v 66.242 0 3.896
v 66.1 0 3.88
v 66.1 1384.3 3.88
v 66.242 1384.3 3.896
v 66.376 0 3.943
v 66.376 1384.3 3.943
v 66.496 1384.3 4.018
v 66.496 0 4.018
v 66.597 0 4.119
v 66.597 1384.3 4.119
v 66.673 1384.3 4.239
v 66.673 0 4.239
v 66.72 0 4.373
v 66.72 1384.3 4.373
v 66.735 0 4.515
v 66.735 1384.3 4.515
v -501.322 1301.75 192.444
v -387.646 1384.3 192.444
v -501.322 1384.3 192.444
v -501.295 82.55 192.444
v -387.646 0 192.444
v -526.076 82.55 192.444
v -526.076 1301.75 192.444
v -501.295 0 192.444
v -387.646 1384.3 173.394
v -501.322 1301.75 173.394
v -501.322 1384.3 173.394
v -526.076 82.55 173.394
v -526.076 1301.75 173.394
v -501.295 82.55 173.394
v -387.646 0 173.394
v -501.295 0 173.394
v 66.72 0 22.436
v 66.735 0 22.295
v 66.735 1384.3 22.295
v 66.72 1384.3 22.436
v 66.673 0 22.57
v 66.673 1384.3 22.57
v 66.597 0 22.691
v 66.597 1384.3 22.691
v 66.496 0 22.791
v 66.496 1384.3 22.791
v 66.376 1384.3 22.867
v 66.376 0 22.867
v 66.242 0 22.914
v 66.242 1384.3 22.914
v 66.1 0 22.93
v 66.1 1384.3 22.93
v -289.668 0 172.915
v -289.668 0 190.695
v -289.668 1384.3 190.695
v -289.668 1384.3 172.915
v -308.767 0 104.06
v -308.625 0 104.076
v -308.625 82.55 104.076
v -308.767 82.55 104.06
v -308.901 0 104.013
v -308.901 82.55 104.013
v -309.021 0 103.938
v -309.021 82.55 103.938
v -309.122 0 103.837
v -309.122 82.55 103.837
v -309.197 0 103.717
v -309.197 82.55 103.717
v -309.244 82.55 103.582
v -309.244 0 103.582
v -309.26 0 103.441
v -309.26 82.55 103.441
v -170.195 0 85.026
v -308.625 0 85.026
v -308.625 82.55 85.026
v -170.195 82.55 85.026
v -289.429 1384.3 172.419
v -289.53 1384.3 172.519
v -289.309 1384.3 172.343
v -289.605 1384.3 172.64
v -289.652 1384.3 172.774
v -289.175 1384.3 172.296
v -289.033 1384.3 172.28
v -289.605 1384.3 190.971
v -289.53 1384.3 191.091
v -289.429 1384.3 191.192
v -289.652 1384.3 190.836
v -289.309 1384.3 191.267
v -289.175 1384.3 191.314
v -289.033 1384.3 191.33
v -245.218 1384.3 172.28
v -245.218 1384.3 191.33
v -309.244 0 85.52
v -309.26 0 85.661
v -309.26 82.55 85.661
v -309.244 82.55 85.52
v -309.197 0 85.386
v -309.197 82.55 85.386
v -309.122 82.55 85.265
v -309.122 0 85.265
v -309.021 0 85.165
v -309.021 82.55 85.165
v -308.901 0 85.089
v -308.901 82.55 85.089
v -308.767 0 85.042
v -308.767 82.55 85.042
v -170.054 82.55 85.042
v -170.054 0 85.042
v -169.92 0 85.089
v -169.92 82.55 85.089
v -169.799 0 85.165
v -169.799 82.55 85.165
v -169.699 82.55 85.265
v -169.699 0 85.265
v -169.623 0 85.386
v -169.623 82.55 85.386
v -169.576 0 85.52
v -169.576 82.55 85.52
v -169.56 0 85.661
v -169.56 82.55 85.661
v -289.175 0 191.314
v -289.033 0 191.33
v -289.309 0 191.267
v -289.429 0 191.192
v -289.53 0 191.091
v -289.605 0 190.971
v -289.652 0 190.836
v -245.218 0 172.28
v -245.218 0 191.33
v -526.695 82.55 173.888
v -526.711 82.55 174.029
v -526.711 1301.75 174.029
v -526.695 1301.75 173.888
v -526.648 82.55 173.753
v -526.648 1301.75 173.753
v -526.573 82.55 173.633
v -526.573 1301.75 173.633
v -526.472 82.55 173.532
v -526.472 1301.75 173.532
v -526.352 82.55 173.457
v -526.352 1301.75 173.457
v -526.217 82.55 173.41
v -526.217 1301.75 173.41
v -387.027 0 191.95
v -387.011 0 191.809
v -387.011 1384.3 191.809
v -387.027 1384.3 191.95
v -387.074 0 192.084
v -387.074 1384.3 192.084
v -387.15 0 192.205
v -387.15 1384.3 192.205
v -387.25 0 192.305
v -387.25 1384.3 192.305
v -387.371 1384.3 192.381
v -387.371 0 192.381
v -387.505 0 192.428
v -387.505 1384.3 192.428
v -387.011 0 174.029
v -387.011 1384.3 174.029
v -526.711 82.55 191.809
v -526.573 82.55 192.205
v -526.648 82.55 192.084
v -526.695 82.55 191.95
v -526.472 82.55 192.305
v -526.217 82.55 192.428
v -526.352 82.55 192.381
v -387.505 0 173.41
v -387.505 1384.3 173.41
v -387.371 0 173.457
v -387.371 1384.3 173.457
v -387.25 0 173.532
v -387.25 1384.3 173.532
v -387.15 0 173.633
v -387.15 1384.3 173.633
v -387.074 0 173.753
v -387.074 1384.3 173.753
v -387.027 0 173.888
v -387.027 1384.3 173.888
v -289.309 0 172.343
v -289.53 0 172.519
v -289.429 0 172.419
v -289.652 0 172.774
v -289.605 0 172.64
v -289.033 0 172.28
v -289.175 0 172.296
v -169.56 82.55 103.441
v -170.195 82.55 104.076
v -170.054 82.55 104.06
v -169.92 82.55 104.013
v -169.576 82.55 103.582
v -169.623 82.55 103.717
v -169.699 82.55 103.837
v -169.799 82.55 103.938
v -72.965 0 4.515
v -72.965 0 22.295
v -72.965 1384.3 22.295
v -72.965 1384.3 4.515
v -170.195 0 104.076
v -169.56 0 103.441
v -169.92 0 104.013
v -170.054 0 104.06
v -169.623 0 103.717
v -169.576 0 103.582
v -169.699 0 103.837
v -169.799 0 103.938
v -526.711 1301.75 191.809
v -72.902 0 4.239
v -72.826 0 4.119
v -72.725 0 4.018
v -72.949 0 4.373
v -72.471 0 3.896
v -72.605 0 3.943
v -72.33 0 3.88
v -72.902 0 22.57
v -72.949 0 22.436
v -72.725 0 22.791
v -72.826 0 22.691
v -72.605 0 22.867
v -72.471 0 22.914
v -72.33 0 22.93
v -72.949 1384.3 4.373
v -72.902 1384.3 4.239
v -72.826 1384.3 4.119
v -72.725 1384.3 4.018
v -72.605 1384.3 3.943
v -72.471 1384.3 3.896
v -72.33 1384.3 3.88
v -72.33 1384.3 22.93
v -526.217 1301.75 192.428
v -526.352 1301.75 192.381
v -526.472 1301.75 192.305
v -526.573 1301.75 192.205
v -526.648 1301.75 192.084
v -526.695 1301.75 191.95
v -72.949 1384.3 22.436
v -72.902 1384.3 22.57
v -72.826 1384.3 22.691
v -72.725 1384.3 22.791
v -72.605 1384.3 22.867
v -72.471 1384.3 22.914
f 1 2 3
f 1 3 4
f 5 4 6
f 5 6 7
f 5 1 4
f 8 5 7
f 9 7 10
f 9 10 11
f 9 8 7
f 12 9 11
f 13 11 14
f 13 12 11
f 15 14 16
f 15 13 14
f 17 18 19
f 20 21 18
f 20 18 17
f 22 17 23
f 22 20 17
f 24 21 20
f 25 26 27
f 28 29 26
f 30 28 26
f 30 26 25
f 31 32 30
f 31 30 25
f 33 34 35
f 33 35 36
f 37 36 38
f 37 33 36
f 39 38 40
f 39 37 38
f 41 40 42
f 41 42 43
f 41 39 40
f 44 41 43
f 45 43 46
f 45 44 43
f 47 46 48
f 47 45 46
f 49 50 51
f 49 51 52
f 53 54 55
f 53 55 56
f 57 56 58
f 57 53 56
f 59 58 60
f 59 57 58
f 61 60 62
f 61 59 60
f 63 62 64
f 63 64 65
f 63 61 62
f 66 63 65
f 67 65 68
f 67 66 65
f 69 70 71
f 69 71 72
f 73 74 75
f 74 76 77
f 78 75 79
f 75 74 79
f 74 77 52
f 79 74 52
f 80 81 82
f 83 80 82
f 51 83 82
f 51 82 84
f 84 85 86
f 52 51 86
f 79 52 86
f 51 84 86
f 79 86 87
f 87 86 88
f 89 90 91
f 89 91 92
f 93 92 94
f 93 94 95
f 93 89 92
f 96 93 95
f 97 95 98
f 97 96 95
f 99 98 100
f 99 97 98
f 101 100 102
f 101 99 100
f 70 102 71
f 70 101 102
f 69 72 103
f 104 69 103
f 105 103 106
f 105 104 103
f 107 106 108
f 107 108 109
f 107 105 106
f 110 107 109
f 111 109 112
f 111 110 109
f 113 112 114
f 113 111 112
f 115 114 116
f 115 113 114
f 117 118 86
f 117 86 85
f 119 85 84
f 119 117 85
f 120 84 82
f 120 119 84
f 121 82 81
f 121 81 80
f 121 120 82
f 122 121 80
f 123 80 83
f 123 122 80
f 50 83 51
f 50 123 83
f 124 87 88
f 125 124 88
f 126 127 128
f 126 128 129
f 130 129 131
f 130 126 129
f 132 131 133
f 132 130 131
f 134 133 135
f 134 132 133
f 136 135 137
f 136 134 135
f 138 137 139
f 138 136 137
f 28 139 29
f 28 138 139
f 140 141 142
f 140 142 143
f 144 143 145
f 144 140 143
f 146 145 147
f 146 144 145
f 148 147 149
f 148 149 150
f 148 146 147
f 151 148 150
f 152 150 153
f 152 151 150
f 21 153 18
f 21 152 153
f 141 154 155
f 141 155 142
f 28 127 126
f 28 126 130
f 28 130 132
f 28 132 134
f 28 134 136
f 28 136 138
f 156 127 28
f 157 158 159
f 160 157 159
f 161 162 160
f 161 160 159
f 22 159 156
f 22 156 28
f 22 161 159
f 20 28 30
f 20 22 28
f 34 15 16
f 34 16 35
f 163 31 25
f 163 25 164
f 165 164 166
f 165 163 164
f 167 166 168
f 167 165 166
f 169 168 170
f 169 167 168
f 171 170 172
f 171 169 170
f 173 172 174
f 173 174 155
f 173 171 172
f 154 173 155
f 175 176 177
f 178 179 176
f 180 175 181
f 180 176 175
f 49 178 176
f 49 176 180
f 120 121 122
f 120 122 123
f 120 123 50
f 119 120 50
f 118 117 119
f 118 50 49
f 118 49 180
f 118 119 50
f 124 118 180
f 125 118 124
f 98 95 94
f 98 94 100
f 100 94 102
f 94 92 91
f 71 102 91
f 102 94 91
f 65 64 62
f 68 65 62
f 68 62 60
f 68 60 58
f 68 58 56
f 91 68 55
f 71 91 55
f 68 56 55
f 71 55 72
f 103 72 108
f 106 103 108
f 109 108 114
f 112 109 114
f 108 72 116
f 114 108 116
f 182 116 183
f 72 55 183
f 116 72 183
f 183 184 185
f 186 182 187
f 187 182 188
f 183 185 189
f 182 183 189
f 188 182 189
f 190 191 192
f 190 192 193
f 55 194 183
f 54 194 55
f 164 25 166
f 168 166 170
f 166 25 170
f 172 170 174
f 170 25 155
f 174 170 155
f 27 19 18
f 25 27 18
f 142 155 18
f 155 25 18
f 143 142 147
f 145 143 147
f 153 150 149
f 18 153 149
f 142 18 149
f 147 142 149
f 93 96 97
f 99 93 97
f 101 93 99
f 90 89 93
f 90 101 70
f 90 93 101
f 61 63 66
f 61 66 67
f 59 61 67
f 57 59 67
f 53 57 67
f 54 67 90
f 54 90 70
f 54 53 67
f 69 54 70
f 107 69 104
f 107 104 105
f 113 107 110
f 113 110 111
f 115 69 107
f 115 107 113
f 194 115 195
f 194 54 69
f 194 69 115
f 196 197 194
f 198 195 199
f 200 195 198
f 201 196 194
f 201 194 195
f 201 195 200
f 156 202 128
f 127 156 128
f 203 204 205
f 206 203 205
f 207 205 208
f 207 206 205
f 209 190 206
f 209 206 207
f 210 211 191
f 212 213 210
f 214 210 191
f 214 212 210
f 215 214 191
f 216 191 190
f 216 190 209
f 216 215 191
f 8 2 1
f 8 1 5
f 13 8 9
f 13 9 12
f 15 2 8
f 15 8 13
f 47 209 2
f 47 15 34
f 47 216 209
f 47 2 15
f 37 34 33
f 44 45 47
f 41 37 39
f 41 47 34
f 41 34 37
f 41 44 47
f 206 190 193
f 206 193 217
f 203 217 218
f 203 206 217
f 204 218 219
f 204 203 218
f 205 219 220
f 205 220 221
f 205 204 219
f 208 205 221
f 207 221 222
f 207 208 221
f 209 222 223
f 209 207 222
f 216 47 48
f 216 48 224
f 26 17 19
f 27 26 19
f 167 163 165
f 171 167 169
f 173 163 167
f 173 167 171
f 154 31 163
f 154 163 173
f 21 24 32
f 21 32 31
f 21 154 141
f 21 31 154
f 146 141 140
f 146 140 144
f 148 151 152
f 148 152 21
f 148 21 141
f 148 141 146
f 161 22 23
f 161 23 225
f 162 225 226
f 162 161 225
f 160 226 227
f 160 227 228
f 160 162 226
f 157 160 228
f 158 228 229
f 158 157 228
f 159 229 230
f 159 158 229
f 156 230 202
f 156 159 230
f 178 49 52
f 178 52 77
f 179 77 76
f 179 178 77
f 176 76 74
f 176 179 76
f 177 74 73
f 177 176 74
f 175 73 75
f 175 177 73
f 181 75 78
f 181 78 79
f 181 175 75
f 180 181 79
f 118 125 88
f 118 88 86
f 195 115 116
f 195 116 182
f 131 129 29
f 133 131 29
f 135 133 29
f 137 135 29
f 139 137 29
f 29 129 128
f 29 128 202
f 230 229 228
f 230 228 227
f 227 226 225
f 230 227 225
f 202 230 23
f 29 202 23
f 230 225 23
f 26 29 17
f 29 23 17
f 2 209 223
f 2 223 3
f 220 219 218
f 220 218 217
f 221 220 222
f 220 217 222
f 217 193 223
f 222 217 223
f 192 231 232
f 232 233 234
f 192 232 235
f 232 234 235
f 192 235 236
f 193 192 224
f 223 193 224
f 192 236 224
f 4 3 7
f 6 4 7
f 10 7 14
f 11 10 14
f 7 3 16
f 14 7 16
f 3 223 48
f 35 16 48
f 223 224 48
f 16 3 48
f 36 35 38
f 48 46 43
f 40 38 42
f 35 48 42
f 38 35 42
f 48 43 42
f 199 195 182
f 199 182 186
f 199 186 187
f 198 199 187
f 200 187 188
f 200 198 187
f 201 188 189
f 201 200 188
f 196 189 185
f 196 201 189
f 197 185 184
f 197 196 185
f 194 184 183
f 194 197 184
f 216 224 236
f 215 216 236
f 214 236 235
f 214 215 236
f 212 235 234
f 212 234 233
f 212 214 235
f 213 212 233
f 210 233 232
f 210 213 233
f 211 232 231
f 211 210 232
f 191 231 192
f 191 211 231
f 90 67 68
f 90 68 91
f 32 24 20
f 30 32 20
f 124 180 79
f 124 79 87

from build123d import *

# Parameters (mm, degrees)
F1_DEPTH  = 1384.3
F3_DEPTH  = 82.55
F5_DEPTH  = 1384.3
F6_W      = 24.7807378674
F6_H      = 82.55
F6_W_2    = 24.7539753819
F7_DEPTH  = 188.5651486045
F8_DEPTH  = 25.4
F10_DEPTH = 1384.3


with BuildPart() as f1:
    # F0 (on Front) → F1 (new body)
    with BuildSketch(Plane.XZ):
        with BuildLine():
            Line((66.1004254112, 22.9297725085), (-72.3295745888, 22.9297725085))
            ThreePointArc((-72.3295745888, 22.9297725085), (-72.7785873949, 22.7437853146), (-72.9645745888, 22.2947725085))
            Line((-72.9645745888, 22.2947725085), (-72.9645745888, 4.5147725085))
            ThreePointArc((-72.9645745888, 4.5147725085), (-72.7785873949, 4.0657597024), (-72.3295745888, 3.8797725085))
            Line((-72.3295745888, 3.8797725085), (66.1004254112, 3.8797725085))
            ThreePointArc((66.1004254112, 3.8797725085), (66.5494382172, 4.0657597024), (66.7354254112, 4.5147725085))
            Line((66.7354254112, 4.5147725085), (66.7354254112, 22.2947725085))
            ThreePointArc((66.7354254112, 22.2947725085), (66.5494382172, 22.7437853146), (66.1004254112, 22.9297725085))
        make_face()
    extrude(amount=-F1_DEPTH)


with BuildPart() as f3:
    # F2 (on Front) → F3 (new body)
    with BuildSketch(Plane.XZ):
        with BuildLine():
            Line((-170.195251379, 104.0761013269), (-308.625251379, 104.0761013269))
            ThreePointArc((-308.625251379, 104.0761013269), (-309.0742641851, 103.890114133), (-309.260251379, 103.4411013269))
            Line((-309.260251379, 103.4411013269), (-309.260251379, 85.6611013269))
            ThreePointArc((-309.260251379, 85.6611013269), (-309.0742641851, 85.2120885209), (-308.625251379, 85.0261013269))
            Line((-308.625251379, 85.0261013269), (-170.195251379, 85.0261013269))
            ThreePointArc((-170.195251379, 85.0261013269), (-169.746238573, 85.2120885209), (-169.560251379, 85.6611013269))
            Line((-169.560251379, 85.6611013269), (-169.560251379, 103.4411013269))
            ThreePointArc((-169.560251379, 103.4411013269), (-169.746238573, 103.890114133), (-170.195251379, 104.0761013269))
        make_face()
    extrude(amount=-F3_DEPTH)


with BuildPart() as f5:
    # F4 (on Front) → F5 (new body)
    with BuildSketch(Plane.XZ):
        with BuildLine():
            Line((-387.6461085415, 192.443921113), (-526.0761085415, 192.443921113))
            ThreePointArc((-526.0761085415, 192.443921113), (-526.5251213475, 192.2579339191), (-526.7111085415, 191.808921113))
            Line((-526.7111085415, 191.808921113), (-526.7111085415, 174.028921113))
            ThreePointArc((-526.7111085415, 174.028921113), (-526.5251213475, 173.579908307), (-526.0761085415, 173.393921113))
            Line((-526.0761085415, 173.393921113), (-387.6461085415, 173.393921113))
            ThreePointArc((-387.6461085415, 173.393921113), (-387.1970957354, 173.579908307), (-387.0111085415, 174.028921113))
            Line((-387.0111085415, 174.028921113), (-387.0111085415, 191.808921113))
            ThreePointArc((-387.0111085415, 191.808921113), (-387.1970957354, 192.2579339191), (-387.6461085415, 192.443921113))
        make_face()
    extrude(amount=-F5_DEPTH)

    # F6 (on face) → F7 (cut, through all)
    with BuildSketch(Plane.XY.offset(192.443921113)):
        with Locations((-513.6857396078, 41.275)):
            Rectangle(F6_W, F6_H)
        with Locations((-513.6991208506, 1343.025)):
            Rectangle(F6_W_2, F6_H)
    extrude(amount=-F7_DEPTH, mode=Mode.SUBTRACT)

    # F8 (cut): faces of the model
    f8_faces = [f5.faces().sort_by_distance(p)[0] for p in [
        (-526.0761085415, 41.275, 182.918921113),
        (-526.0761085415, 1343.025, 182.918921113),
    ]]
    extrude(f8_faces, amount=-F8_DEPTH, mode=Mode.SUBTRACT)


with BuildPart() as f10:
    # F9 (on Front) → F10 (new body)
    with BuildSketch(Plane.XZ):
        with BuildLine():
            Line((-245.8532493448, 191.3300444126), (-289.0332493448, 191.3300444126))
            ThreePointArc((-289.0332493448, 191.3300444126), (-289.4822621509, 191.1440572187), (-289.6682493448, 190.6950444126))
            Line((-289.6682493448, 190.6950444126), (-289.6682493448, 172.9150444126))
            ThreePointArc((-289.6682493448, 172.9150444126), (-289.4822621509, 172.4660316066), (-289.0332493448, 172.2800444126))
            Line((-289.0332493448, 172.2800444126), (-245.8532493448, 172.2800444126))
            Line((-245.8532493448, 172.2800444126), (-245.2182493448, 172.2800444126))
            Line((-245.2182493448, 172.2800444126), (-245.2182493448, 172.9150444126))
            Line((-245.2182493448, 172.9150444126), (-245.2182493448, 190.6950444126))
            Line((-245.2182493448, 190.6950444126), (-245.2182493448, 191.3300444126))
            Line((-245.2182493448, 191.3300444126), (-245.8532493448, 191.3300444126))
        make_face()
    extrude(amount=-F10_DEPTH)


solid = Compound([f1.part, f3.part, f5.part, f10.part])
